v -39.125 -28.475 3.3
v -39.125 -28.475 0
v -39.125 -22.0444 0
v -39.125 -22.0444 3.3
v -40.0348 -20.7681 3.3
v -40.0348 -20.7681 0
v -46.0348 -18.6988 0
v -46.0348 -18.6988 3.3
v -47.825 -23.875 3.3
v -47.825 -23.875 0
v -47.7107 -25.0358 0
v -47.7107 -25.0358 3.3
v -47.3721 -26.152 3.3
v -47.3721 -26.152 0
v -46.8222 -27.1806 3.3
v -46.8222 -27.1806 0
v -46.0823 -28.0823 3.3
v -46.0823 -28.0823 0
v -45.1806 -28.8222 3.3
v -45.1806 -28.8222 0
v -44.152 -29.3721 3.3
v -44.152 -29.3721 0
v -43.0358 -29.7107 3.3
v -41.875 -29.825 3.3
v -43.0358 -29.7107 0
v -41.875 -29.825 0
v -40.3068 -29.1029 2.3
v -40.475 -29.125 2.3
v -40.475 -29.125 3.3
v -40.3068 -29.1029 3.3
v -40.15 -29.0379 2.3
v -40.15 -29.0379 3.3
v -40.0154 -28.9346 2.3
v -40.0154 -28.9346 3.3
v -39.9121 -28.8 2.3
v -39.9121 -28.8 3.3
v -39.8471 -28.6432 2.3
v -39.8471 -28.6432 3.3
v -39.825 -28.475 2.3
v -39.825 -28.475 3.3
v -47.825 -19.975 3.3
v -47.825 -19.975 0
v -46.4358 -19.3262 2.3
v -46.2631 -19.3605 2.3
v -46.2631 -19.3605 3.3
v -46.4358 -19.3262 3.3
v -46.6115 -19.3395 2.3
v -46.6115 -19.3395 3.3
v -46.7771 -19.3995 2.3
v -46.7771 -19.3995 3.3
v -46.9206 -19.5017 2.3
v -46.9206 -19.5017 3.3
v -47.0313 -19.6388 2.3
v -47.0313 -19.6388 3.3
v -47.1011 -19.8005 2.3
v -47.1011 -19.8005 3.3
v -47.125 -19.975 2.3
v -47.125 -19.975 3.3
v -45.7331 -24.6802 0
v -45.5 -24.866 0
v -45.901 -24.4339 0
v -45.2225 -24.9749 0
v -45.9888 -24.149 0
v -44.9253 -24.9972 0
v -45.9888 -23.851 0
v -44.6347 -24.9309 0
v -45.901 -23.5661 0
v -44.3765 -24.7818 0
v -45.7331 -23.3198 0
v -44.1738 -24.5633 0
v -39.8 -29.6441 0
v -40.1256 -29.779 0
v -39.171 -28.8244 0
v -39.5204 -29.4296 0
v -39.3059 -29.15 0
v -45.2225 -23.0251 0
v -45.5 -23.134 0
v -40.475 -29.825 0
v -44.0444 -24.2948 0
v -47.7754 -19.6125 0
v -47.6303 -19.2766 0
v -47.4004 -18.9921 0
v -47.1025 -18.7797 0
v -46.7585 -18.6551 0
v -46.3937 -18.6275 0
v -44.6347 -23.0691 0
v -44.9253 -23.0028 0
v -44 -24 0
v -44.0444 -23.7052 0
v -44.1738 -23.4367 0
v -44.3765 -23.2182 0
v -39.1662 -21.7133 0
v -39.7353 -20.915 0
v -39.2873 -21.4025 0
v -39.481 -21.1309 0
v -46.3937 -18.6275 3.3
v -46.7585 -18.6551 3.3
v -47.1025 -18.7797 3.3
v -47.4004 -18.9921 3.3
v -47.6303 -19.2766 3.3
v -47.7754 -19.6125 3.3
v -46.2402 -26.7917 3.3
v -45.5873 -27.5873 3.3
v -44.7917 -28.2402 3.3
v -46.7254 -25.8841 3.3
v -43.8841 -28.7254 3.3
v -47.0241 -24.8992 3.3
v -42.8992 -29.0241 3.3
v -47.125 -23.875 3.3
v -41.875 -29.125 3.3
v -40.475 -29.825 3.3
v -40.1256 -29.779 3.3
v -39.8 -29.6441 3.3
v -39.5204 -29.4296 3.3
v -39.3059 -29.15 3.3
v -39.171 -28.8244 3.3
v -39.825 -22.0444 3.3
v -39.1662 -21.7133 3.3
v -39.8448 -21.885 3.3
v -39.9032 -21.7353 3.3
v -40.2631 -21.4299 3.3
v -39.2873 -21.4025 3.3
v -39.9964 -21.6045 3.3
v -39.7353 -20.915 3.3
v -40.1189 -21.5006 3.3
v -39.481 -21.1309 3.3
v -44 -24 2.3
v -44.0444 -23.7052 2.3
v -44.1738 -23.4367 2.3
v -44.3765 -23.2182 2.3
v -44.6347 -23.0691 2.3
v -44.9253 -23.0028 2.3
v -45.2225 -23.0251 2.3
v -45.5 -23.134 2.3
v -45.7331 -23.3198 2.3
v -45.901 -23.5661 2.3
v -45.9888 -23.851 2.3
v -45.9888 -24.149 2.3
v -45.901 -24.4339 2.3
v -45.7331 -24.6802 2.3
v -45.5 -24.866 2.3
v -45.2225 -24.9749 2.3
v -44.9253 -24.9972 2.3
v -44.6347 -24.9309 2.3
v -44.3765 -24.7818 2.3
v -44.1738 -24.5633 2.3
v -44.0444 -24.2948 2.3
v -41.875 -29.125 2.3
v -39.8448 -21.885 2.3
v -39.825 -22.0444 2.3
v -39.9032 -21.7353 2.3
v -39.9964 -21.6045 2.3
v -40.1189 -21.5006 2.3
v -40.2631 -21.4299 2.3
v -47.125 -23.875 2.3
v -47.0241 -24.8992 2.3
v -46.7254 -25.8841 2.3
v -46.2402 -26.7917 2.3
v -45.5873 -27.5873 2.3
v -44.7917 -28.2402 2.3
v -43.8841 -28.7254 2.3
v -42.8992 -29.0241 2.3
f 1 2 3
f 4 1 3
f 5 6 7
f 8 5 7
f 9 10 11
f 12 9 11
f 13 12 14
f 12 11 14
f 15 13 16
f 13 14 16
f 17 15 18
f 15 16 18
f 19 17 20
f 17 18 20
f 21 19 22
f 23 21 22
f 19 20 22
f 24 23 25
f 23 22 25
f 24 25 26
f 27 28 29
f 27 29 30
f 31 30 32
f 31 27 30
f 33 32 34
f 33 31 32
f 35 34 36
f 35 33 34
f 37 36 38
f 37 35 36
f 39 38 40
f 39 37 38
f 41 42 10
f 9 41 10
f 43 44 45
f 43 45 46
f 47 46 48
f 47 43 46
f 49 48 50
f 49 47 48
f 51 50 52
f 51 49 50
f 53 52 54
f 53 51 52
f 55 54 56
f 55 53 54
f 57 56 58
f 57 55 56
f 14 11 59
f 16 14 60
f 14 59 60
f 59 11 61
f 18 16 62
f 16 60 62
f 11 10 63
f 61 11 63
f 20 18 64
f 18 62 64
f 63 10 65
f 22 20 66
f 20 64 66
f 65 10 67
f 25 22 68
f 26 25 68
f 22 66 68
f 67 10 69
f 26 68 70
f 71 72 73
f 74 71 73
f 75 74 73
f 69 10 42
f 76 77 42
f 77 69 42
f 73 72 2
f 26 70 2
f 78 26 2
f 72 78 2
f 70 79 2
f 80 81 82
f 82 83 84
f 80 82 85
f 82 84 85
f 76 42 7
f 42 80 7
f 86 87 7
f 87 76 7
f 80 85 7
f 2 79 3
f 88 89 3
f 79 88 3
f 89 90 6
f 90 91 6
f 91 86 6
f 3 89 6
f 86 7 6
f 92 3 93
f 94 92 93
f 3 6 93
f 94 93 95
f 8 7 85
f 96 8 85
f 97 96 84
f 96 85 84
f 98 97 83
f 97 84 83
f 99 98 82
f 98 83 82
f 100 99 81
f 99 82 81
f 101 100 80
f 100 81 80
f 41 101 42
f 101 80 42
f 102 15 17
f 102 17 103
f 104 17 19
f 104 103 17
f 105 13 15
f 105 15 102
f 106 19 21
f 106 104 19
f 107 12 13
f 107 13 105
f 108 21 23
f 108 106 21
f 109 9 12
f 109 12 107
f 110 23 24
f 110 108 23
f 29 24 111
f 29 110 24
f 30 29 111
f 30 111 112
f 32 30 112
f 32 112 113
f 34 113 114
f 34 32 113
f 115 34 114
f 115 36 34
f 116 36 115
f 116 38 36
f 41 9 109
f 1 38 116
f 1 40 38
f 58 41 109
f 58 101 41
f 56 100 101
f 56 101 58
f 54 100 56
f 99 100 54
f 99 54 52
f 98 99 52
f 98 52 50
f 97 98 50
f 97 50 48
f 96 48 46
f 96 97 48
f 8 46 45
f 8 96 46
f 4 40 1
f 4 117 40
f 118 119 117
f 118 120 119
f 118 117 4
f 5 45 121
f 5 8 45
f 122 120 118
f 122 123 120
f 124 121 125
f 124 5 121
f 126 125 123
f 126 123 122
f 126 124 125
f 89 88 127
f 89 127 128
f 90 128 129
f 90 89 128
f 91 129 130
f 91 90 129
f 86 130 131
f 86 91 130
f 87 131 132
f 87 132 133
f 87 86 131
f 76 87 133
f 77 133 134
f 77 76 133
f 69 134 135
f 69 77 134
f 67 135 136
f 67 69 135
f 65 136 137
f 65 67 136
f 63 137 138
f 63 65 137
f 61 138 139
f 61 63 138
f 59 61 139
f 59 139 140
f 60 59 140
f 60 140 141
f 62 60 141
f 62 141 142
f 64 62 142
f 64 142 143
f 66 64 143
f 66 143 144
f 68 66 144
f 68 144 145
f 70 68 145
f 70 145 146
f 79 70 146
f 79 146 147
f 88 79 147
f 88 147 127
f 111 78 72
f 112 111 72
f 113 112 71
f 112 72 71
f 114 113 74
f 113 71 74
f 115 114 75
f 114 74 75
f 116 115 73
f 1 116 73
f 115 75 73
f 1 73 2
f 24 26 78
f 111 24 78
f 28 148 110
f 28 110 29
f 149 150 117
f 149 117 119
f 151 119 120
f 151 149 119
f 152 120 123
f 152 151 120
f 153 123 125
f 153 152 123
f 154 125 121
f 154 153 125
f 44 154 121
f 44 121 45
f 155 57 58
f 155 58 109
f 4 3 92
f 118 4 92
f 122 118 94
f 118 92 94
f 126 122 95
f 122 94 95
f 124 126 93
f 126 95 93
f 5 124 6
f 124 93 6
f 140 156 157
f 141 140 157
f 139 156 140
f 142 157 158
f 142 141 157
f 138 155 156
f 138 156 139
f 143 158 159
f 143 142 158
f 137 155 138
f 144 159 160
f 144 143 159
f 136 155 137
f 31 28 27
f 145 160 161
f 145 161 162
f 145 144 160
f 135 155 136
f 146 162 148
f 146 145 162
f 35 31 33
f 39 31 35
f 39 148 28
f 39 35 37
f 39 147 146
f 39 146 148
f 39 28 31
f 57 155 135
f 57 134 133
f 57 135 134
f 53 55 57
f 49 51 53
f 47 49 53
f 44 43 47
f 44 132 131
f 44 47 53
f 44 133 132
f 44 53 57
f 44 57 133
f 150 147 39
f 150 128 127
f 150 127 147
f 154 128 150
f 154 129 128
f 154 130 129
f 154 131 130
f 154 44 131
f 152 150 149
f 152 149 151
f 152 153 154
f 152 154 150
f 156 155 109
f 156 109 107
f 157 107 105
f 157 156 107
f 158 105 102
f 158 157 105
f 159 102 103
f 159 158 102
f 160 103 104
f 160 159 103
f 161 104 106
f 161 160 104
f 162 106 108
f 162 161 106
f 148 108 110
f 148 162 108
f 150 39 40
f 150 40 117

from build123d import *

# Parameters (mm, degrees)
SKETCH1_R           = 1
BOSS_EXTRUDE1_DEPTH = 3.3
CUT_EXTRUDE1_START  = -1
SKETCH2_R           = 1
CUT_EXTRUDE1_DEPTH  = 1


with BuildPart() as part:
    # Sketch1 → Boss-Extrude1 (new body)
    with BuildSketch(Plane.XY):
        with BuildLine():
            Line((-47.825, -19.975), (-47.825, -23.875))
            ThreePointArc((-47.825, -23.875), (-46.082285348, -28.082285348), (-41.875, -29.825))
            Line((-41.875, -29.825), (-40.475, -29.825))
            ThreePointArc((-40.475, -29.825), (-39.520405845, -29.429594155), (-39.125, -28.475))
            Line((-39.125, -28.475), (-39.125, -22.044366415))
            ThreePointArc((-39.125, -22.044366415), (-39.375745502, -21.260695854), (-40.034836368, -20.768139171))
            Line((-40.034836368, -20.768139171), (-46.034836368, -18.698772757))
            ThreePointArc((-46.034836368, -18.698772757), (-47.258670561, -18.875745502), (-47.825, -19.975))
        make_face()
        with Locations((-45, -24)):
            Circle(SKETCH1_R, mode=Mode.SUBTRACT)
    extrude(amount=BOSS_EXTRUDE1_DEPTH)

    # Sketch2 → Cut-Extrude1 (cut)
    with BuildSketch(Plane.XY.offset(3.3).offset(CUT_EXTRUDE1_START)):
        with BuildLine():
            Line((-40.263069362, -21.429886631), (-46.263069362, -19.360520216))
            ThreePointArc((-46.263069362, -19.360520216), (-46.852322863, -19.445729316), (-47.125, -19.975))
            Line((-47.125, -19.975), (-47.125, -23.875))
            ThreePointArc((-47.125, -23.875), (-45.587310601, -27.587310601), (-41.875, -29.125))
            Line((-41.875, -29.125), (-40.475, -29.125))
            ThreePointArc((-40.475, -29.125), (-40.015380592, -28.934619408), (-39.825, -28.475))
            Line((-39.825, -28.475), (-39.825, -22.044366415))
            ThreePointArc((-39.825, -22.044366415), (-39.945729316, -21.667043552), (-40.263069362, -21.429886631))
        make_face()
        with Locations((-45, -24)):
            Circle(SKETCH2_R, mode=Mode.SUBTRACT)
    extrude(amount=CUT_EXTRUDE1_DEPTH, mode=Mode.SUBTRACT)


solid = part.part
